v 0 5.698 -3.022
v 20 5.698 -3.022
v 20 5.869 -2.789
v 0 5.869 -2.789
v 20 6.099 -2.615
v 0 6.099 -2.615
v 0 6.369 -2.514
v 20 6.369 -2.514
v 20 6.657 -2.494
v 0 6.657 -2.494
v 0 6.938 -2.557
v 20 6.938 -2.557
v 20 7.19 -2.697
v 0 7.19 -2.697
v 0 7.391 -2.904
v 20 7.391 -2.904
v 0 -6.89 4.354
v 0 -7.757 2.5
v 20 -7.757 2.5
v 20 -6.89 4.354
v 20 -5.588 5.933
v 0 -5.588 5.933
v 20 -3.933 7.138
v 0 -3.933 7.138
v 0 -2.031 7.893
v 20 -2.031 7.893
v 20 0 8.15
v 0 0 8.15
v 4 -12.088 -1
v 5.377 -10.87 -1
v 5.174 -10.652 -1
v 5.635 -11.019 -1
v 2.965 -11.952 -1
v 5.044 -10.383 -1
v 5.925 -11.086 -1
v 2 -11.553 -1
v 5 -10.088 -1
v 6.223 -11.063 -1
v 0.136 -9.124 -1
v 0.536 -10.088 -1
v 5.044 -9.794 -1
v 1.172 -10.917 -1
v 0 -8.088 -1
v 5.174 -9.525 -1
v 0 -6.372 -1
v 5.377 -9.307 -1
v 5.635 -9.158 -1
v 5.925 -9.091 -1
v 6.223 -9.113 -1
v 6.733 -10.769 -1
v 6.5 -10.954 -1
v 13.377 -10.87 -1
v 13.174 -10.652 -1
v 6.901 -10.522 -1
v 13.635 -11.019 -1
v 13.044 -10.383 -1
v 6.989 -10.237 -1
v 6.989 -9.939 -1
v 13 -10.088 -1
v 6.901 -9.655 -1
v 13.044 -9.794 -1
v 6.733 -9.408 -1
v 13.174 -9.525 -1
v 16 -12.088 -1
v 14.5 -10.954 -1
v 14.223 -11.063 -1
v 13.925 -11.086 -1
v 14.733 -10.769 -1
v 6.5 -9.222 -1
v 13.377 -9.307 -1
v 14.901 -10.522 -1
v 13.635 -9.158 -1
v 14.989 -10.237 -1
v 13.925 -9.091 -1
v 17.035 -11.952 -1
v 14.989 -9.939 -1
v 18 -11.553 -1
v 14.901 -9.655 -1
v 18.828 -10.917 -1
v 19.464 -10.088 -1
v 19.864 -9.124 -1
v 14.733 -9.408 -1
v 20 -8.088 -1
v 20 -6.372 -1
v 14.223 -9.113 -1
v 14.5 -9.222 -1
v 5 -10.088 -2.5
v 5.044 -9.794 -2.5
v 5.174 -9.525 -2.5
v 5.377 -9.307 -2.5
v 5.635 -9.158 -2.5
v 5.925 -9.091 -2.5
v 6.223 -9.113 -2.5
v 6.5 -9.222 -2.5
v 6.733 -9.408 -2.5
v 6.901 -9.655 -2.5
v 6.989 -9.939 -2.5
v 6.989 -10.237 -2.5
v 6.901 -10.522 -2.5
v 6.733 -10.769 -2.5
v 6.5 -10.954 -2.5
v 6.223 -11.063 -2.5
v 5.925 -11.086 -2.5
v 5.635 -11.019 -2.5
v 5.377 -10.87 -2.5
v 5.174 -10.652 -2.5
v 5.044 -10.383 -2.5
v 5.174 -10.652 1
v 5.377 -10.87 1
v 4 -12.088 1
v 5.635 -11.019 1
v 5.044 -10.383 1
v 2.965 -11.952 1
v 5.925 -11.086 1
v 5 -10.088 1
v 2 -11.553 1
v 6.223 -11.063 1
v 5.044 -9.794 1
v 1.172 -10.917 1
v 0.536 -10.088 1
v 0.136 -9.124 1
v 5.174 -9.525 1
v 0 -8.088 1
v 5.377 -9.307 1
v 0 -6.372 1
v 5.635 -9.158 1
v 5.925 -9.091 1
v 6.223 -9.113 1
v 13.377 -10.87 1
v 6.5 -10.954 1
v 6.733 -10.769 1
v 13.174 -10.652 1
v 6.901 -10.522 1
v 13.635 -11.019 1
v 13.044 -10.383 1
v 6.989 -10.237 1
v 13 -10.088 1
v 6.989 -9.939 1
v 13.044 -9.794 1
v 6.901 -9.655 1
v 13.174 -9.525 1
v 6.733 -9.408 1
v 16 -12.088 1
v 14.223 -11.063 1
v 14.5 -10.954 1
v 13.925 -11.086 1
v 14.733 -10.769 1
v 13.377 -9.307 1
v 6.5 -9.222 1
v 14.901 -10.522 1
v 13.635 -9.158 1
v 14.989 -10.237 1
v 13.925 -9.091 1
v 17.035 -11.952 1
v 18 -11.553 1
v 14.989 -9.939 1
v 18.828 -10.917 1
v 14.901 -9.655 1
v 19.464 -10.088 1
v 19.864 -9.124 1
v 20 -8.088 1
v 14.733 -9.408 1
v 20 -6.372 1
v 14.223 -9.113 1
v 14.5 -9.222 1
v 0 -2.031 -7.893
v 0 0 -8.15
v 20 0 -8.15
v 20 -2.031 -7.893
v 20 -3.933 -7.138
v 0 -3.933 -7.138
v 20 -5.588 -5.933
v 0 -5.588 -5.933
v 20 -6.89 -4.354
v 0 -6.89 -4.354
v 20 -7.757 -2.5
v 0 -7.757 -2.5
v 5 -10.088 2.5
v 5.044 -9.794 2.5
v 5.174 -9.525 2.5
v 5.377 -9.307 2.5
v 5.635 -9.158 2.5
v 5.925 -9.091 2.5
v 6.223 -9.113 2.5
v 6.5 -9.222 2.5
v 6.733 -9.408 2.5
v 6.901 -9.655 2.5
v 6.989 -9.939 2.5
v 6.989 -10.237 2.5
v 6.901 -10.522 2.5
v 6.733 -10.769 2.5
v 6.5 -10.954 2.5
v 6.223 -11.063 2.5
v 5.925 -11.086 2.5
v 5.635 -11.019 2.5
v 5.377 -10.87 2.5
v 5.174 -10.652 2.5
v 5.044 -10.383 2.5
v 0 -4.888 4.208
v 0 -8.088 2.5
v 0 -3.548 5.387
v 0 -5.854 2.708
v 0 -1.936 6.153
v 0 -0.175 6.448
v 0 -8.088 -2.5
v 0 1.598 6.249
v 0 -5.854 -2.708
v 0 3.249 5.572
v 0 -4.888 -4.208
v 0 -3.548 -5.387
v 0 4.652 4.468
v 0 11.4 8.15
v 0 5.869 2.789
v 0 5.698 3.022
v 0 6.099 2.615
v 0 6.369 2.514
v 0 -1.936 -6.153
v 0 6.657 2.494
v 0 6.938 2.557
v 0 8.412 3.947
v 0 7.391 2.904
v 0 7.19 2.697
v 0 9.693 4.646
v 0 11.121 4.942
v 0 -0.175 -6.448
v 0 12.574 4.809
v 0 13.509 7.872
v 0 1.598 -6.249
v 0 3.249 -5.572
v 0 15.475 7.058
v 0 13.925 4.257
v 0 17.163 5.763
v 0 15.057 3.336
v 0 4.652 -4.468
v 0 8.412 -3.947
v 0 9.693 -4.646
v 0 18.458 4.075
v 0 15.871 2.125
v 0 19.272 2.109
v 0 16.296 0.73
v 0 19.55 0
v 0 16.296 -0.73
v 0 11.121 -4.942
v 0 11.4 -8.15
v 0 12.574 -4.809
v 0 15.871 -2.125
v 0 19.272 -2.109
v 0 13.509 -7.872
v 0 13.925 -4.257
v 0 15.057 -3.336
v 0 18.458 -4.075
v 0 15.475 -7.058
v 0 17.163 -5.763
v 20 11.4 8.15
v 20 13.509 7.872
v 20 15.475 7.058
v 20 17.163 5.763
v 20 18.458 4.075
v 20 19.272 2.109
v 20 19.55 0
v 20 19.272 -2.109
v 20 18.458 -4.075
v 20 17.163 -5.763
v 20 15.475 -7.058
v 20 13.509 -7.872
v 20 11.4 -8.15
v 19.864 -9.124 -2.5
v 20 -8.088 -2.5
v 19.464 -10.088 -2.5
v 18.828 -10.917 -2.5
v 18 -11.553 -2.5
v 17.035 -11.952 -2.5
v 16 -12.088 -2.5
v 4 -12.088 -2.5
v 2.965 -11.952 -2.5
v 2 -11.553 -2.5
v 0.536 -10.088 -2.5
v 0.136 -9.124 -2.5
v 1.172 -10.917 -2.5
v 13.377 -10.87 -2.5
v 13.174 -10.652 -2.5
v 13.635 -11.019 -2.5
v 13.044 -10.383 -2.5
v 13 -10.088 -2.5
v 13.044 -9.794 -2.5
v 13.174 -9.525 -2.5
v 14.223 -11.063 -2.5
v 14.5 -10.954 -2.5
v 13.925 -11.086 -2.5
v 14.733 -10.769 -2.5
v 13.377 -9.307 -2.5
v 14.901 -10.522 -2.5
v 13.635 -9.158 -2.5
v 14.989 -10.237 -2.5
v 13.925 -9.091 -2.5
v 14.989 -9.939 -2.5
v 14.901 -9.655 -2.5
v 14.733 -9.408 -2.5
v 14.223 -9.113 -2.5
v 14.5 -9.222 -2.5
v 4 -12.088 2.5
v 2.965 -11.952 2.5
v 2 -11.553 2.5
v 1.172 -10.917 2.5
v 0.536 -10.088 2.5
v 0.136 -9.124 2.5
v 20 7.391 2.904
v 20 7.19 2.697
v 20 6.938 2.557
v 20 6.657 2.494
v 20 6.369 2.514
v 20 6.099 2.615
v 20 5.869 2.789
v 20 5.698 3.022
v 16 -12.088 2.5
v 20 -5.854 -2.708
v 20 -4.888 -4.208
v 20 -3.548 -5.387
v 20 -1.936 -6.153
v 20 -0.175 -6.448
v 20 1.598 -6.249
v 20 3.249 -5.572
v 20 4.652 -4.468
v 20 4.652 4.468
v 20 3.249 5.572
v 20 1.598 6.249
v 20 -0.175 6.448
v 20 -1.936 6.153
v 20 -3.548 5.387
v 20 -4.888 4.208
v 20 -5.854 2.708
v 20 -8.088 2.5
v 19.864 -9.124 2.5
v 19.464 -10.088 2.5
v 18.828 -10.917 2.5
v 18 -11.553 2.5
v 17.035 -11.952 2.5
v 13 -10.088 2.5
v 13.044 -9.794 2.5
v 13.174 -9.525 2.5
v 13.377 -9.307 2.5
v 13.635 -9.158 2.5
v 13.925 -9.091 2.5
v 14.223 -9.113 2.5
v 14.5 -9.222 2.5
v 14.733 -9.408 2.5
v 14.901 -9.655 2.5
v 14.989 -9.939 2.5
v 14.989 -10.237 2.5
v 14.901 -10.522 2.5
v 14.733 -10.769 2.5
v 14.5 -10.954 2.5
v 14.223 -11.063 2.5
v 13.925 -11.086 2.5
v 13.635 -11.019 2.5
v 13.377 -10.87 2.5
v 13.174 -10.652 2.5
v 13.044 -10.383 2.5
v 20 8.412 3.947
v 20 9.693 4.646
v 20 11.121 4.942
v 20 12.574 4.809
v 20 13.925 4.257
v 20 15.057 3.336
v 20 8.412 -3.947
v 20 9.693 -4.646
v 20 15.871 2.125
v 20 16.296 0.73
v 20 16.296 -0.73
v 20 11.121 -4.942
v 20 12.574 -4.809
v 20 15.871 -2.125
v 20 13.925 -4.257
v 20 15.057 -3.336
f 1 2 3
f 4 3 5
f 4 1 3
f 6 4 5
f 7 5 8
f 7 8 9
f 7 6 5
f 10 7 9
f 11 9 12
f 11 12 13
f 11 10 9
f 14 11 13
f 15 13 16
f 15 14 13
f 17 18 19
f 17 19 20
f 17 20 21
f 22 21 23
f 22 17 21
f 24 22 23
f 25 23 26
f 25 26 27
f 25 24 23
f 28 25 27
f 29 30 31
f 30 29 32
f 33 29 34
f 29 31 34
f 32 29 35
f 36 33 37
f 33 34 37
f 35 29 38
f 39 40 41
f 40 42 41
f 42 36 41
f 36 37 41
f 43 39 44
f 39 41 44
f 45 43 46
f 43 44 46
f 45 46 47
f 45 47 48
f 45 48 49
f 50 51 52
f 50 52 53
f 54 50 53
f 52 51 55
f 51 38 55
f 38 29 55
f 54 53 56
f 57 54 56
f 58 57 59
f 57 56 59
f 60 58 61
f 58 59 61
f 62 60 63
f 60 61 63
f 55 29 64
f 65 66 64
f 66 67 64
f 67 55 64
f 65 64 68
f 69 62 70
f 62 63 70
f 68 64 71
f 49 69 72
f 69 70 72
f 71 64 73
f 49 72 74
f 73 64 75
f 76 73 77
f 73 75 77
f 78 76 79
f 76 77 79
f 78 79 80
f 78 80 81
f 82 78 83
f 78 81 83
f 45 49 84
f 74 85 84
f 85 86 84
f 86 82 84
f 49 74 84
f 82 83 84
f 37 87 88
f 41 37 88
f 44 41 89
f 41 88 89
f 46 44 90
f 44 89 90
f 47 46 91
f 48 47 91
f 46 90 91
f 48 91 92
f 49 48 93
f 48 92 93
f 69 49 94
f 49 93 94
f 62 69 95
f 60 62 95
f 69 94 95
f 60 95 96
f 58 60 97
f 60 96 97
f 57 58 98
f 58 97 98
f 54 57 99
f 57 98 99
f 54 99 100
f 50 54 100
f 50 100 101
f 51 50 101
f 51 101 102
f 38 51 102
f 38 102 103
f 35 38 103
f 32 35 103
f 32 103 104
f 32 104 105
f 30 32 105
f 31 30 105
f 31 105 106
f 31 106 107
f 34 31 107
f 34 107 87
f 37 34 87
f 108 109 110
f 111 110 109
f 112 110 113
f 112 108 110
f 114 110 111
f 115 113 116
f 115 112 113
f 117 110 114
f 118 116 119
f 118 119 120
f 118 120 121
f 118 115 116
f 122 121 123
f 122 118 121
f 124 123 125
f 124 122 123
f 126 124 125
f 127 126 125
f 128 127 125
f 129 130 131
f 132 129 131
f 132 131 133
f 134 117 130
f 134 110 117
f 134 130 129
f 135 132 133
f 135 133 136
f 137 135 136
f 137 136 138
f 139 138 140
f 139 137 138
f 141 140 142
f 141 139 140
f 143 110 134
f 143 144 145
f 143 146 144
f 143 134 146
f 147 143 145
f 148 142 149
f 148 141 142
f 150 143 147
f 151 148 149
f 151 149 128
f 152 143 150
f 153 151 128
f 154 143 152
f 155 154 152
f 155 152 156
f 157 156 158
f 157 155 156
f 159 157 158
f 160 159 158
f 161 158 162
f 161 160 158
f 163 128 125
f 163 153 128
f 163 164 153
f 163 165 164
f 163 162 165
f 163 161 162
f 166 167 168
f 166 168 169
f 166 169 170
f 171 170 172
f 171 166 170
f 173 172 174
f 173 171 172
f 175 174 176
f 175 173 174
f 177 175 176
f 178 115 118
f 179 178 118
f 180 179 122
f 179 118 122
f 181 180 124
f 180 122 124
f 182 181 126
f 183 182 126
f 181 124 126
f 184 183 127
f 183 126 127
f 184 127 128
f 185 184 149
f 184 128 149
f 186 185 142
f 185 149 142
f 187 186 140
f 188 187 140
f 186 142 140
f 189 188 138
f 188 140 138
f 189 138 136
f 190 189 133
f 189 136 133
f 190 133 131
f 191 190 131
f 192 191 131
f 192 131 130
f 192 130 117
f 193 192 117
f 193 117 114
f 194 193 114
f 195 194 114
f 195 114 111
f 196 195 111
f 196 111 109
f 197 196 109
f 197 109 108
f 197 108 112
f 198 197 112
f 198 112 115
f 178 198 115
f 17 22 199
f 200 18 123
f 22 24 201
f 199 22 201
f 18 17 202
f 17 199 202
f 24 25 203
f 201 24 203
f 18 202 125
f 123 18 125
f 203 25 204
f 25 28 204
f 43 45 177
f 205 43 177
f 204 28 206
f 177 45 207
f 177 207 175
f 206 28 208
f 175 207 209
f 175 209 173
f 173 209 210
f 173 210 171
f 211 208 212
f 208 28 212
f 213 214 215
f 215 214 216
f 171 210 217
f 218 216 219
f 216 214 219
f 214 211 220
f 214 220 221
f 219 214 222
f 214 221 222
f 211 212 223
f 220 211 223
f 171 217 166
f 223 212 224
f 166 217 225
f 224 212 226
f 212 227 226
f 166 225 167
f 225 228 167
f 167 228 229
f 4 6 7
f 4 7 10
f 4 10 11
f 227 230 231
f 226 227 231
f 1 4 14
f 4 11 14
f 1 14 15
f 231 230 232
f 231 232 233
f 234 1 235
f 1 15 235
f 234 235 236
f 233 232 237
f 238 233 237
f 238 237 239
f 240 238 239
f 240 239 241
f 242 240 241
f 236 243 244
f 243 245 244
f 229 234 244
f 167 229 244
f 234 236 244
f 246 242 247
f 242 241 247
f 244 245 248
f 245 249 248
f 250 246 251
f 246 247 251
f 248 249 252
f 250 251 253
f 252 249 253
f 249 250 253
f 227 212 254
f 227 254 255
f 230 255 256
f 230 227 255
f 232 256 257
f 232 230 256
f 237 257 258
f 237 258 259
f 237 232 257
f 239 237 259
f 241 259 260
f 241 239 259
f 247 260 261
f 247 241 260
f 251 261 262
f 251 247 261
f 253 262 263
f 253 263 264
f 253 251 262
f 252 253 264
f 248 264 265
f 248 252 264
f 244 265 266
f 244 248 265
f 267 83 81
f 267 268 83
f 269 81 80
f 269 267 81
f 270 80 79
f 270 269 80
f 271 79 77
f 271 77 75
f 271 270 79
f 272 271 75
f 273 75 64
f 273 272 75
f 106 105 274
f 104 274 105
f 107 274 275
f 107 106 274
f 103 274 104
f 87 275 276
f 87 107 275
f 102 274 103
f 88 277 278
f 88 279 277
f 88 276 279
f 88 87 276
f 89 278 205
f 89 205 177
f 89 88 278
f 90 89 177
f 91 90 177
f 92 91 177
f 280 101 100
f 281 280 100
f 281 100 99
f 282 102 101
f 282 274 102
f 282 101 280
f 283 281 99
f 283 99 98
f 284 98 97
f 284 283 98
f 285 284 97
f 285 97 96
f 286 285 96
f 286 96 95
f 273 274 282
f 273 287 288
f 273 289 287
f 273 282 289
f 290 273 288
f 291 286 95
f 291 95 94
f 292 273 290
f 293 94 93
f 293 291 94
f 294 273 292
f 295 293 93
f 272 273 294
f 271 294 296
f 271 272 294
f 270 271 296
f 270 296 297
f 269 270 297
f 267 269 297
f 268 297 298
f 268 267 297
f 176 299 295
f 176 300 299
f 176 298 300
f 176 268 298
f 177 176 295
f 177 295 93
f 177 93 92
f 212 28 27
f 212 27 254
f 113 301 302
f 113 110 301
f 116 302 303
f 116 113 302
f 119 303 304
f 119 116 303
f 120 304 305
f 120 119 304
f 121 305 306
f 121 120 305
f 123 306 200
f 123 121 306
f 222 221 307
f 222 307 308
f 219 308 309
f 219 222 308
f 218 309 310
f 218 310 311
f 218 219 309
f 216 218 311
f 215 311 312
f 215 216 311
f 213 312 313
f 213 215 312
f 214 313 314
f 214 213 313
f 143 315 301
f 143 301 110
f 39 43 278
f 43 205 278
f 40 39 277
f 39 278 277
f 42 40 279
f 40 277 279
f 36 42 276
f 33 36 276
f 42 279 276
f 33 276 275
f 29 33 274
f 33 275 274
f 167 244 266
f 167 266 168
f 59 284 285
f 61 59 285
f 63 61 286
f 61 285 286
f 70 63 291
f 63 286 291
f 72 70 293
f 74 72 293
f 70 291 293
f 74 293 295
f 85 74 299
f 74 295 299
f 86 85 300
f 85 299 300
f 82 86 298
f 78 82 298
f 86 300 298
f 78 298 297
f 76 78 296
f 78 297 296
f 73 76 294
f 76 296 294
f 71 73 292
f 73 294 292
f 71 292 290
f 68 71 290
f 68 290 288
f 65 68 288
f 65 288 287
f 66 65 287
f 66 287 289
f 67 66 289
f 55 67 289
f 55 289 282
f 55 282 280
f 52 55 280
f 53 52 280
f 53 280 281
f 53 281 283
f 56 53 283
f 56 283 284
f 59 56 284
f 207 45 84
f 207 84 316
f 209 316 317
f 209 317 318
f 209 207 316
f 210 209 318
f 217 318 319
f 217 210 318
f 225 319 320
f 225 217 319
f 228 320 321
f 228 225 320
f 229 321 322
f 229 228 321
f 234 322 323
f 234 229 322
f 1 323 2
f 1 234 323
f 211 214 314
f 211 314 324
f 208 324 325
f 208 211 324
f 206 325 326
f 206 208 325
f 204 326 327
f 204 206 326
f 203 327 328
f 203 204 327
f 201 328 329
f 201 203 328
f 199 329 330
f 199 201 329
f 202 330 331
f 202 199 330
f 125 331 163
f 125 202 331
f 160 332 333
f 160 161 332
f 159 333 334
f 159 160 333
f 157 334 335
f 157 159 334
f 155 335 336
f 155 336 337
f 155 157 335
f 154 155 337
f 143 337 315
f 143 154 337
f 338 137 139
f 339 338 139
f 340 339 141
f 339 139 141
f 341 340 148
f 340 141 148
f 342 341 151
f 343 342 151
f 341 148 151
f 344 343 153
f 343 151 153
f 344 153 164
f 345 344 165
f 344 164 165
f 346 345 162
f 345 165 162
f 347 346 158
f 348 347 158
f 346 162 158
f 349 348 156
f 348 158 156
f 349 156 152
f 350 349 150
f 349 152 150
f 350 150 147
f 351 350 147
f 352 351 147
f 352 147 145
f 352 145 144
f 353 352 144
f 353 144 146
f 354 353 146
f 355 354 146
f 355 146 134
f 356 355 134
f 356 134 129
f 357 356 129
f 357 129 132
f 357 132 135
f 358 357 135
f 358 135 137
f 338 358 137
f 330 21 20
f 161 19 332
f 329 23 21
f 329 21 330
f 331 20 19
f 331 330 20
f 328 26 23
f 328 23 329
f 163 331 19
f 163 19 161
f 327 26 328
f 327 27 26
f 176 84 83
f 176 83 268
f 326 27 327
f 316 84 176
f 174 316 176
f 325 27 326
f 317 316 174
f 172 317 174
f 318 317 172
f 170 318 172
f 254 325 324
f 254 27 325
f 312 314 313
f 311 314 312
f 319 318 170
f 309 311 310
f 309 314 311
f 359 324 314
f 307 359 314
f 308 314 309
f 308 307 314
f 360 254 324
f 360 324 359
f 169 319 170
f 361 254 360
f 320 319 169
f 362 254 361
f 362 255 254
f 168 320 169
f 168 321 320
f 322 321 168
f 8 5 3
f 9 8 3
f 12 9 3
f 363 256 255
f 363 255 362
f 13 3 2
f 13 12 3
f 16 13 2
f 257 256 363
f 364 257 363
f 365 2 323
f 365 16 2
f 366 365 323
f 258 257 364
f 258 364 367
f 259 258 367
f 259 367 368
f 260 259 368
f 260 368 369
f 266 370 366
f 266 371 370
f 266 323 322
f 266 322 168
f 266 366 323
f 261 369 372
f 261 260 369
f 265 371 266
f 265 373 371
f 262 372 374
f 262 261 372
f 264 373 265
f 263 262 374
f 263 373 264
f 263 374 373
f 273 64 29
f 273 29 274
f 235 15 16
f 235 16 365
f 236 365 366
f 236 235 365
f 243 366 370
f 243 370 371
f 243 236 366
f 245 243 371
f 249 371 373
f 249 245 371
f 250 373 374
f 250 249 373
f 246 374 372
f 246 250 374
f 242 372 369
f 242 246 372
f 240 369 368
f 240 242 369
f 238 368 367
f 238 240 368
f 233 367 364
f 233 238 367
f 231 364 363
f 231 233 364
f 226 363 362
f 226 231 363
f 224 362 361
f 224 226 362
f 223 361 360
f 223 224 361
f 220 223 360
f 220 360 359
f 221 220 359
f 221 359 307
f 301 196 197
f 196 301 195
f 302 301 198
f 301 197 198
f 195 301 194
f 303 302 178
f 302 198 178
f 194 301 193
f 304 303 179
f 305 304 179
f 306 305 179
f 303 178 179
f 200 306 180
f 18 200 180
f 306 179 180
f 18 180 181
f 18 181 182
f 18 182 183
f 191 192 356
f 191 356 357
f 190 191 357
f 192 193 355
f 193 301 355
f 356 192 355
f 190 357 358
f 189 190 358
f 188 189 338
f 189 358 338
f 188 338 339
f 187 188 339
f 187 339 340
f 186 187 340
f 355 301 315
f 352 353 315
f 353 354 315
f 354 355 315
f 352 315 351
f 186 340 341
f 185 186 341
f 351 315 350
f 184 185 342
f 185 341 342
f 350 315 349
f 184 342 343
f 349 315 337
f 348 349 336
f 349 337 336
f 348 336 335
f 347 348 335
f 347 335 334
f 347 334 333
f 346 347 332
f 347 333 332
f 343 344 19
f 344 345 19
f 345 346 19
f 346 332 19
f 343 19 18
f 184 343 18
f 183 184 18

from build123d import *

# Parameters (mm, degrees)
BOSS_EXTRUDE2_DEPTH = 20
SKETCH2_W           = 2
SKETCH2_H           = 9.242730417
CUT_EXTRUDE1_DEPTH  = 20
SKETCH3_W           = 1.5
SKETCH3_H           = 5.716408543
BOSS_EXTRUDE3_DEPTH = 20
SKETCH4_R           = 1
CUT_EXTRUDE2_DEPTH  = 11.65
FILLET1_R           = 4


with BuildPart() as part:
    # Sketch1 → Boss-Extrude2 (new body)
    with BuildSketch(Plane(origin=(0, 0, 0), x_dir=(0, 0, -1), z_dir=(1, 0, 0))):
        with BuildLine():
            Line((8.15, 11.4), (8.15, 0))
            ThreePointArc((8.15, 0), (0, -8.15), (-8.15, 0))
            Line((-8.15, 0), (-8.15, 11.4))
            ThreePointArc((-8.15, 11.4), (0, 19.55), (8.15, 11.4))
        make_face()
        with BuildLine():
            ThreePointArc((2.904067302, 7.391397612), (0, 16.35), (-2.904067302, 7.391397612))
            ThreePointArc((-2.904067302, 7.391397612), (-2.493172041, 6.511986737), (-3.022190844, 5.698145532))
            ThreePointArc((-3.022190844, 5.698145532), (0, -6.45), (3.022190844, 5.698145532))
            ThreePointArc((3.022190844, 5.698145532), (2.493172041, 6.511986737), (2.904067302, 7.391397612))
        make_face(mode=Mode.SUBTRACT)
    extrude(amount=BOSS_EXTRUDE2_DEPTH)

    # Sketch2 → Cut-Extrude1 (cut)
    with BuildSketch(Plane(origin=(20, 0, 0), x_dir=(0, 0, -1), z_dir=(1, 0, 0))):
        with Locations((0, -7.363862564)):
            Rectangle(SKETCH2_W, SKETCH2_H)
    extrude(amount=-CUT_EXTRUDE1_DEPTH, mode=Mode.SUBTRACT)

    # Sketch3 → Boss-Extrude3 (add)
    with BuildSketch(Plane(origin=(20, 0, 0), x_dir=(0, 0, -1), z_dir=(1, 0, 0))):
        with Locations((-1.75, -9.230213374)):
            Rectangle(SKETCH3_W, SKETCH3_H)
        with Locations((1.75, -9.230213374)):
            Rectangle(SKETCH3_W, SKETCH3_H)
    extrude(amount=-BOSS_EXTRUDE3_DEPTH)

    # Sketch4 → Cut-Extrude2 (cut, through all)
    with BuildSketch(Plane(origin=(0, 0, -2.5), x_dir=(-1, 0, 0), z_dir=(0, 0, -1))):
        with Locations((-14, -10.088417645)):
            Circle(SKETCH4_R)
        with Locations((-6, -10.088417645)):
            Circle(SKETCH4_R)
    extrude(amount=-CUT_EXTRUDE2_DEPTH, mode=Mode.SUBTRACT)

    # Fillet1
    fillet1_edges = [part.edges().sort_by_distance(p)[0] for p in [
        (20, -12.088417645, 1.75),
        (0, -12.088417645, 1.75),
        (20, -12.088417645, -1.75),
        (0, -12.088417645, -1.75),
    ]]
    fillet(fillet1_edges, radius=FILLET1_R)


solid = part.part
